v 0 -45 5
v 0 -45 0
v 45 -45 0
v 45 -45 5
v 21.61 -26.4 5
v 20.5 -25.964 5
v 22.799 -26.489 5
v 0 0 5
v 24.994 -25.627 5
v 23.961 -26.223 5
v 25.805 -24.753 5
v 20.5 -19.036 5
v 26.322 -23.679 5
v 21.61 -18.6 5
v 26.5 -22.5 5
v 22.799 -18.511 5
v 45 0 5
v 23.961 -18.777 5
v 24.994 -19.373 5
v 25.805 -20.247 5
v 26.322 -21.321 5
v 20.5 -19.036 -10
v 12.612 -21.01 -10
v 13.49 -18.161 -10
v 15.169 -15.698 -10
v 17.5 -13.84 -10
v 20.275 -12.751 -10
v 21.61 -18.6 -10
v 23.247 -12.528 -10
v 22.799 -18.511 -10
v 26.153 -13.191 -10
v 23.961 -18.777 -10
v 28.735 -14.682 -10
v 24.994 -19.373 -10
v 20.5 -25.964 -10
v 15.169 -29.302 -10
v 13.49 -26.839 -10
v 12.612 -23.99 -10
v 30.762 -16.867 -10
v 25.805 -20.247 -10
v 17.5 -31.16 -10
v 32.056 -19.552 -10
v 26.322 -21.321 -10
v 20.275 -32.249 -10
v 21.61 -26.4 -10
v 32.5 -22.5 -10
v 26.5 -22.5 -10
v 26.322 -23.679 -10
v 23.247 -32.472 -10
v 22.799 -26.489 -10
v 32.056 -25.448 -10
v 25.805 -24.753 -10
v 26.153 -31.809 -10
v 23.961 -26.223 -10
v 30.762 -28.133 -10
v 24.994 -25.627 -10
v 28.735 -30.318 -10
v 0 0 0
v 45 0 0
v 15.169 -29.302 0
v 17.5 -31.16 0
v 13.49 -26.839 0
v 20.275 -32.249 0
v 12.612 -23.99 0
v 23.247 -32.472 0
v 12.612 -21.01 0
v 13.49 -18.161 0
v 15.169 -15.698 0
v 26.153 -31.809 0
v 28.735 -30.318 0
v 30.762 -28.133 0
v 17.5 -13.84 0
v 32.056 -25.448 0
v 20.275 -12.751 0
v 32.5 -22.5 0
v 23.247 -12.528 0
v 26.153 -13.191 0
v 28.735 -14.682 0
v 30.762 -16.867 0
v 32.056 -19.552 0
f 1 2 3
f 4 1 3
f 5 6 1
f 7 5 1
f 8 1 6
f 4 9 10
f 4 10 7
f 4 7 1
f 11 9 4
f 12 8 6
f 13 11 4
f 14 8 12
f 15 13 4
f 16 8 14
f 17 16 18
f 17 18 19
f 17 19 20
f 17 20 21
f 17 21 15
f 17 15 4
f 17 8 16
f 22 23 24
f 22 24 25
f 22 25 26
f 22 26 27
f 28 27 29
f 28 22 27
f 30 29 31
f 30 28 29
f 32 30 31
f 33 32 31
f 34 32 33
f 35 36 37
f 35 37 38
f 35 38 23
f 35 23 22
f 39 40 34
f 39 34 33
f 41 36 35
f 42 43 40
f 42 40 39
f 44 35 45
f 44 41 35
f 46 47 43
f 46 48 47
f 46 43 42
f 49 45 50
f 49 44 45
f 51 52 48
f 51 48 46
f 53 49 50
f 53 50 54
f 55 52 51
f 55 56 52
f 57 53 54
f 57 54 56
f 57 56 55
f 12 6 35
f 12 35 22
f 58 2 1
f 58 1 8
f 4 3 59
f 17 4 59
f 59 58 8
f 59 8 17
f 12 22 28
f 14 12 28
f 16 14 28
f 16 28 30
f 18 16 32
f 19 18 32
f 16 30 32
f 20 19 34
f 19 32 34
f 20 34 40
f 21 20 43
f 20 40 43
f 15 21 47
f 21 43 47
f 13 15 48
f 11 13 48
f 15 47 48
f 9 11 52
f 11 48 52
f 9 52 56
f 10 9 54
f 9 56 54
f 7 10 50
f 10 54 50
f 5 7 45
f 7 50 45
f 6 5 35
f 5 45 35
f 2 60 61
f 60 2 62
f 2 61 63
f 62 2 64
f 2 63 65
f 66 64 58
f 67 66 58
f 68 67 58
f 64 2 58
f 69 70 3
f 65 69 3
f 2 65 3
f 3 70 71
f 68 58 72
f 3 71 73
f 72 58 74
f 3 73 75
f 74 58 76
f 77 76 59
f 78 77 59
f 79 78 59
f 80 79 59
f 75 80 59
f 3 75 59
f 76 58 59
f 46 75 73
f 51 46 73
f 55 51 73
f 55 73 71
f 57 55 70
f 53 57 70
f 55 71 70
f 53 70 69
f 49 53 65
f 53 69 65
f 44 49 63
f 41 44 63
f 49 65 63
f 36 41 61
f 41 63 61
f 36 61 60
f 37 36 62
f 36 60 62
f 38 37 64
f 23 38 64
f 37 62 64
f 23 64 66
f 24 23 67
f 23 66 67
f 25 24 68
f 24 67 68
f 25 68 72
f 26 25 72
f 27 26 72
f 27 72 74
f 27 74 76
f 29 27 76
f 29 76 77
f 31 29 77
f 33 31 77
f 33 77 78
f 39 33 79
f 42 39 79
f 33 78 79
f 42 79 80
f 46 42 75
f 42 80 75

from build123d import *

# Parameters (mm, degrees)
EXTRUDE002_DEPTH = 20
SKETCH003_R      = 10
EXTRUDE_DEPTH    = 10
SKETCH_W         = 45
SKETCH_H         = 45
PAD_DEPTH        = 5


with BuildPart() as extrude002:
    # Sketch008 (on Face1 of CopyExtrude) → Extrude002 (new body)
    with BuildSketch(Plane(origin=(0, 0, -10), x_dir=(1, 0, 0), z_dir=(0, 0, -1))):
        with BuildLine():
            ThreePointArc((20.5, 19.035898), (26.5, 22.5), (20.5, 25.964102))
            Line((20.5, 25.964102), (20.5, 19.035898))
        make_face()
    extrude(amount=-EXTRUDE002_DEPTH)


with BuildPart() as valec:
    # Sketch003 → Extrude (new body)
    with BuildSketch(Plane(origin=(0, 0, 0), x_dir=(1, 0, 0), z_dir=(0, 0, -1))):
        with Locations((22.5, 22.5)):
            Circle(SKETCH003_R)
    extrude(amount=EXTRUDE_DEPTH)


with BuildPart() as koncovkaalprofilu:
    # Sketch → Pad (new body)
    with BuildSketch(Plane.XY):
        with Locations((22.5, -22.5)):
            Rectangle(SKETCH_W, SKETCH_H)
    extrude(amount=PAD_DEPTH)

    # Fusion: union Valec
    add(valec.part)

    # Cut: cut Extrude002
    add(extrude002.part, mode=Mode.SUBTRACT)


solid = koncovkaalprofilu.part
